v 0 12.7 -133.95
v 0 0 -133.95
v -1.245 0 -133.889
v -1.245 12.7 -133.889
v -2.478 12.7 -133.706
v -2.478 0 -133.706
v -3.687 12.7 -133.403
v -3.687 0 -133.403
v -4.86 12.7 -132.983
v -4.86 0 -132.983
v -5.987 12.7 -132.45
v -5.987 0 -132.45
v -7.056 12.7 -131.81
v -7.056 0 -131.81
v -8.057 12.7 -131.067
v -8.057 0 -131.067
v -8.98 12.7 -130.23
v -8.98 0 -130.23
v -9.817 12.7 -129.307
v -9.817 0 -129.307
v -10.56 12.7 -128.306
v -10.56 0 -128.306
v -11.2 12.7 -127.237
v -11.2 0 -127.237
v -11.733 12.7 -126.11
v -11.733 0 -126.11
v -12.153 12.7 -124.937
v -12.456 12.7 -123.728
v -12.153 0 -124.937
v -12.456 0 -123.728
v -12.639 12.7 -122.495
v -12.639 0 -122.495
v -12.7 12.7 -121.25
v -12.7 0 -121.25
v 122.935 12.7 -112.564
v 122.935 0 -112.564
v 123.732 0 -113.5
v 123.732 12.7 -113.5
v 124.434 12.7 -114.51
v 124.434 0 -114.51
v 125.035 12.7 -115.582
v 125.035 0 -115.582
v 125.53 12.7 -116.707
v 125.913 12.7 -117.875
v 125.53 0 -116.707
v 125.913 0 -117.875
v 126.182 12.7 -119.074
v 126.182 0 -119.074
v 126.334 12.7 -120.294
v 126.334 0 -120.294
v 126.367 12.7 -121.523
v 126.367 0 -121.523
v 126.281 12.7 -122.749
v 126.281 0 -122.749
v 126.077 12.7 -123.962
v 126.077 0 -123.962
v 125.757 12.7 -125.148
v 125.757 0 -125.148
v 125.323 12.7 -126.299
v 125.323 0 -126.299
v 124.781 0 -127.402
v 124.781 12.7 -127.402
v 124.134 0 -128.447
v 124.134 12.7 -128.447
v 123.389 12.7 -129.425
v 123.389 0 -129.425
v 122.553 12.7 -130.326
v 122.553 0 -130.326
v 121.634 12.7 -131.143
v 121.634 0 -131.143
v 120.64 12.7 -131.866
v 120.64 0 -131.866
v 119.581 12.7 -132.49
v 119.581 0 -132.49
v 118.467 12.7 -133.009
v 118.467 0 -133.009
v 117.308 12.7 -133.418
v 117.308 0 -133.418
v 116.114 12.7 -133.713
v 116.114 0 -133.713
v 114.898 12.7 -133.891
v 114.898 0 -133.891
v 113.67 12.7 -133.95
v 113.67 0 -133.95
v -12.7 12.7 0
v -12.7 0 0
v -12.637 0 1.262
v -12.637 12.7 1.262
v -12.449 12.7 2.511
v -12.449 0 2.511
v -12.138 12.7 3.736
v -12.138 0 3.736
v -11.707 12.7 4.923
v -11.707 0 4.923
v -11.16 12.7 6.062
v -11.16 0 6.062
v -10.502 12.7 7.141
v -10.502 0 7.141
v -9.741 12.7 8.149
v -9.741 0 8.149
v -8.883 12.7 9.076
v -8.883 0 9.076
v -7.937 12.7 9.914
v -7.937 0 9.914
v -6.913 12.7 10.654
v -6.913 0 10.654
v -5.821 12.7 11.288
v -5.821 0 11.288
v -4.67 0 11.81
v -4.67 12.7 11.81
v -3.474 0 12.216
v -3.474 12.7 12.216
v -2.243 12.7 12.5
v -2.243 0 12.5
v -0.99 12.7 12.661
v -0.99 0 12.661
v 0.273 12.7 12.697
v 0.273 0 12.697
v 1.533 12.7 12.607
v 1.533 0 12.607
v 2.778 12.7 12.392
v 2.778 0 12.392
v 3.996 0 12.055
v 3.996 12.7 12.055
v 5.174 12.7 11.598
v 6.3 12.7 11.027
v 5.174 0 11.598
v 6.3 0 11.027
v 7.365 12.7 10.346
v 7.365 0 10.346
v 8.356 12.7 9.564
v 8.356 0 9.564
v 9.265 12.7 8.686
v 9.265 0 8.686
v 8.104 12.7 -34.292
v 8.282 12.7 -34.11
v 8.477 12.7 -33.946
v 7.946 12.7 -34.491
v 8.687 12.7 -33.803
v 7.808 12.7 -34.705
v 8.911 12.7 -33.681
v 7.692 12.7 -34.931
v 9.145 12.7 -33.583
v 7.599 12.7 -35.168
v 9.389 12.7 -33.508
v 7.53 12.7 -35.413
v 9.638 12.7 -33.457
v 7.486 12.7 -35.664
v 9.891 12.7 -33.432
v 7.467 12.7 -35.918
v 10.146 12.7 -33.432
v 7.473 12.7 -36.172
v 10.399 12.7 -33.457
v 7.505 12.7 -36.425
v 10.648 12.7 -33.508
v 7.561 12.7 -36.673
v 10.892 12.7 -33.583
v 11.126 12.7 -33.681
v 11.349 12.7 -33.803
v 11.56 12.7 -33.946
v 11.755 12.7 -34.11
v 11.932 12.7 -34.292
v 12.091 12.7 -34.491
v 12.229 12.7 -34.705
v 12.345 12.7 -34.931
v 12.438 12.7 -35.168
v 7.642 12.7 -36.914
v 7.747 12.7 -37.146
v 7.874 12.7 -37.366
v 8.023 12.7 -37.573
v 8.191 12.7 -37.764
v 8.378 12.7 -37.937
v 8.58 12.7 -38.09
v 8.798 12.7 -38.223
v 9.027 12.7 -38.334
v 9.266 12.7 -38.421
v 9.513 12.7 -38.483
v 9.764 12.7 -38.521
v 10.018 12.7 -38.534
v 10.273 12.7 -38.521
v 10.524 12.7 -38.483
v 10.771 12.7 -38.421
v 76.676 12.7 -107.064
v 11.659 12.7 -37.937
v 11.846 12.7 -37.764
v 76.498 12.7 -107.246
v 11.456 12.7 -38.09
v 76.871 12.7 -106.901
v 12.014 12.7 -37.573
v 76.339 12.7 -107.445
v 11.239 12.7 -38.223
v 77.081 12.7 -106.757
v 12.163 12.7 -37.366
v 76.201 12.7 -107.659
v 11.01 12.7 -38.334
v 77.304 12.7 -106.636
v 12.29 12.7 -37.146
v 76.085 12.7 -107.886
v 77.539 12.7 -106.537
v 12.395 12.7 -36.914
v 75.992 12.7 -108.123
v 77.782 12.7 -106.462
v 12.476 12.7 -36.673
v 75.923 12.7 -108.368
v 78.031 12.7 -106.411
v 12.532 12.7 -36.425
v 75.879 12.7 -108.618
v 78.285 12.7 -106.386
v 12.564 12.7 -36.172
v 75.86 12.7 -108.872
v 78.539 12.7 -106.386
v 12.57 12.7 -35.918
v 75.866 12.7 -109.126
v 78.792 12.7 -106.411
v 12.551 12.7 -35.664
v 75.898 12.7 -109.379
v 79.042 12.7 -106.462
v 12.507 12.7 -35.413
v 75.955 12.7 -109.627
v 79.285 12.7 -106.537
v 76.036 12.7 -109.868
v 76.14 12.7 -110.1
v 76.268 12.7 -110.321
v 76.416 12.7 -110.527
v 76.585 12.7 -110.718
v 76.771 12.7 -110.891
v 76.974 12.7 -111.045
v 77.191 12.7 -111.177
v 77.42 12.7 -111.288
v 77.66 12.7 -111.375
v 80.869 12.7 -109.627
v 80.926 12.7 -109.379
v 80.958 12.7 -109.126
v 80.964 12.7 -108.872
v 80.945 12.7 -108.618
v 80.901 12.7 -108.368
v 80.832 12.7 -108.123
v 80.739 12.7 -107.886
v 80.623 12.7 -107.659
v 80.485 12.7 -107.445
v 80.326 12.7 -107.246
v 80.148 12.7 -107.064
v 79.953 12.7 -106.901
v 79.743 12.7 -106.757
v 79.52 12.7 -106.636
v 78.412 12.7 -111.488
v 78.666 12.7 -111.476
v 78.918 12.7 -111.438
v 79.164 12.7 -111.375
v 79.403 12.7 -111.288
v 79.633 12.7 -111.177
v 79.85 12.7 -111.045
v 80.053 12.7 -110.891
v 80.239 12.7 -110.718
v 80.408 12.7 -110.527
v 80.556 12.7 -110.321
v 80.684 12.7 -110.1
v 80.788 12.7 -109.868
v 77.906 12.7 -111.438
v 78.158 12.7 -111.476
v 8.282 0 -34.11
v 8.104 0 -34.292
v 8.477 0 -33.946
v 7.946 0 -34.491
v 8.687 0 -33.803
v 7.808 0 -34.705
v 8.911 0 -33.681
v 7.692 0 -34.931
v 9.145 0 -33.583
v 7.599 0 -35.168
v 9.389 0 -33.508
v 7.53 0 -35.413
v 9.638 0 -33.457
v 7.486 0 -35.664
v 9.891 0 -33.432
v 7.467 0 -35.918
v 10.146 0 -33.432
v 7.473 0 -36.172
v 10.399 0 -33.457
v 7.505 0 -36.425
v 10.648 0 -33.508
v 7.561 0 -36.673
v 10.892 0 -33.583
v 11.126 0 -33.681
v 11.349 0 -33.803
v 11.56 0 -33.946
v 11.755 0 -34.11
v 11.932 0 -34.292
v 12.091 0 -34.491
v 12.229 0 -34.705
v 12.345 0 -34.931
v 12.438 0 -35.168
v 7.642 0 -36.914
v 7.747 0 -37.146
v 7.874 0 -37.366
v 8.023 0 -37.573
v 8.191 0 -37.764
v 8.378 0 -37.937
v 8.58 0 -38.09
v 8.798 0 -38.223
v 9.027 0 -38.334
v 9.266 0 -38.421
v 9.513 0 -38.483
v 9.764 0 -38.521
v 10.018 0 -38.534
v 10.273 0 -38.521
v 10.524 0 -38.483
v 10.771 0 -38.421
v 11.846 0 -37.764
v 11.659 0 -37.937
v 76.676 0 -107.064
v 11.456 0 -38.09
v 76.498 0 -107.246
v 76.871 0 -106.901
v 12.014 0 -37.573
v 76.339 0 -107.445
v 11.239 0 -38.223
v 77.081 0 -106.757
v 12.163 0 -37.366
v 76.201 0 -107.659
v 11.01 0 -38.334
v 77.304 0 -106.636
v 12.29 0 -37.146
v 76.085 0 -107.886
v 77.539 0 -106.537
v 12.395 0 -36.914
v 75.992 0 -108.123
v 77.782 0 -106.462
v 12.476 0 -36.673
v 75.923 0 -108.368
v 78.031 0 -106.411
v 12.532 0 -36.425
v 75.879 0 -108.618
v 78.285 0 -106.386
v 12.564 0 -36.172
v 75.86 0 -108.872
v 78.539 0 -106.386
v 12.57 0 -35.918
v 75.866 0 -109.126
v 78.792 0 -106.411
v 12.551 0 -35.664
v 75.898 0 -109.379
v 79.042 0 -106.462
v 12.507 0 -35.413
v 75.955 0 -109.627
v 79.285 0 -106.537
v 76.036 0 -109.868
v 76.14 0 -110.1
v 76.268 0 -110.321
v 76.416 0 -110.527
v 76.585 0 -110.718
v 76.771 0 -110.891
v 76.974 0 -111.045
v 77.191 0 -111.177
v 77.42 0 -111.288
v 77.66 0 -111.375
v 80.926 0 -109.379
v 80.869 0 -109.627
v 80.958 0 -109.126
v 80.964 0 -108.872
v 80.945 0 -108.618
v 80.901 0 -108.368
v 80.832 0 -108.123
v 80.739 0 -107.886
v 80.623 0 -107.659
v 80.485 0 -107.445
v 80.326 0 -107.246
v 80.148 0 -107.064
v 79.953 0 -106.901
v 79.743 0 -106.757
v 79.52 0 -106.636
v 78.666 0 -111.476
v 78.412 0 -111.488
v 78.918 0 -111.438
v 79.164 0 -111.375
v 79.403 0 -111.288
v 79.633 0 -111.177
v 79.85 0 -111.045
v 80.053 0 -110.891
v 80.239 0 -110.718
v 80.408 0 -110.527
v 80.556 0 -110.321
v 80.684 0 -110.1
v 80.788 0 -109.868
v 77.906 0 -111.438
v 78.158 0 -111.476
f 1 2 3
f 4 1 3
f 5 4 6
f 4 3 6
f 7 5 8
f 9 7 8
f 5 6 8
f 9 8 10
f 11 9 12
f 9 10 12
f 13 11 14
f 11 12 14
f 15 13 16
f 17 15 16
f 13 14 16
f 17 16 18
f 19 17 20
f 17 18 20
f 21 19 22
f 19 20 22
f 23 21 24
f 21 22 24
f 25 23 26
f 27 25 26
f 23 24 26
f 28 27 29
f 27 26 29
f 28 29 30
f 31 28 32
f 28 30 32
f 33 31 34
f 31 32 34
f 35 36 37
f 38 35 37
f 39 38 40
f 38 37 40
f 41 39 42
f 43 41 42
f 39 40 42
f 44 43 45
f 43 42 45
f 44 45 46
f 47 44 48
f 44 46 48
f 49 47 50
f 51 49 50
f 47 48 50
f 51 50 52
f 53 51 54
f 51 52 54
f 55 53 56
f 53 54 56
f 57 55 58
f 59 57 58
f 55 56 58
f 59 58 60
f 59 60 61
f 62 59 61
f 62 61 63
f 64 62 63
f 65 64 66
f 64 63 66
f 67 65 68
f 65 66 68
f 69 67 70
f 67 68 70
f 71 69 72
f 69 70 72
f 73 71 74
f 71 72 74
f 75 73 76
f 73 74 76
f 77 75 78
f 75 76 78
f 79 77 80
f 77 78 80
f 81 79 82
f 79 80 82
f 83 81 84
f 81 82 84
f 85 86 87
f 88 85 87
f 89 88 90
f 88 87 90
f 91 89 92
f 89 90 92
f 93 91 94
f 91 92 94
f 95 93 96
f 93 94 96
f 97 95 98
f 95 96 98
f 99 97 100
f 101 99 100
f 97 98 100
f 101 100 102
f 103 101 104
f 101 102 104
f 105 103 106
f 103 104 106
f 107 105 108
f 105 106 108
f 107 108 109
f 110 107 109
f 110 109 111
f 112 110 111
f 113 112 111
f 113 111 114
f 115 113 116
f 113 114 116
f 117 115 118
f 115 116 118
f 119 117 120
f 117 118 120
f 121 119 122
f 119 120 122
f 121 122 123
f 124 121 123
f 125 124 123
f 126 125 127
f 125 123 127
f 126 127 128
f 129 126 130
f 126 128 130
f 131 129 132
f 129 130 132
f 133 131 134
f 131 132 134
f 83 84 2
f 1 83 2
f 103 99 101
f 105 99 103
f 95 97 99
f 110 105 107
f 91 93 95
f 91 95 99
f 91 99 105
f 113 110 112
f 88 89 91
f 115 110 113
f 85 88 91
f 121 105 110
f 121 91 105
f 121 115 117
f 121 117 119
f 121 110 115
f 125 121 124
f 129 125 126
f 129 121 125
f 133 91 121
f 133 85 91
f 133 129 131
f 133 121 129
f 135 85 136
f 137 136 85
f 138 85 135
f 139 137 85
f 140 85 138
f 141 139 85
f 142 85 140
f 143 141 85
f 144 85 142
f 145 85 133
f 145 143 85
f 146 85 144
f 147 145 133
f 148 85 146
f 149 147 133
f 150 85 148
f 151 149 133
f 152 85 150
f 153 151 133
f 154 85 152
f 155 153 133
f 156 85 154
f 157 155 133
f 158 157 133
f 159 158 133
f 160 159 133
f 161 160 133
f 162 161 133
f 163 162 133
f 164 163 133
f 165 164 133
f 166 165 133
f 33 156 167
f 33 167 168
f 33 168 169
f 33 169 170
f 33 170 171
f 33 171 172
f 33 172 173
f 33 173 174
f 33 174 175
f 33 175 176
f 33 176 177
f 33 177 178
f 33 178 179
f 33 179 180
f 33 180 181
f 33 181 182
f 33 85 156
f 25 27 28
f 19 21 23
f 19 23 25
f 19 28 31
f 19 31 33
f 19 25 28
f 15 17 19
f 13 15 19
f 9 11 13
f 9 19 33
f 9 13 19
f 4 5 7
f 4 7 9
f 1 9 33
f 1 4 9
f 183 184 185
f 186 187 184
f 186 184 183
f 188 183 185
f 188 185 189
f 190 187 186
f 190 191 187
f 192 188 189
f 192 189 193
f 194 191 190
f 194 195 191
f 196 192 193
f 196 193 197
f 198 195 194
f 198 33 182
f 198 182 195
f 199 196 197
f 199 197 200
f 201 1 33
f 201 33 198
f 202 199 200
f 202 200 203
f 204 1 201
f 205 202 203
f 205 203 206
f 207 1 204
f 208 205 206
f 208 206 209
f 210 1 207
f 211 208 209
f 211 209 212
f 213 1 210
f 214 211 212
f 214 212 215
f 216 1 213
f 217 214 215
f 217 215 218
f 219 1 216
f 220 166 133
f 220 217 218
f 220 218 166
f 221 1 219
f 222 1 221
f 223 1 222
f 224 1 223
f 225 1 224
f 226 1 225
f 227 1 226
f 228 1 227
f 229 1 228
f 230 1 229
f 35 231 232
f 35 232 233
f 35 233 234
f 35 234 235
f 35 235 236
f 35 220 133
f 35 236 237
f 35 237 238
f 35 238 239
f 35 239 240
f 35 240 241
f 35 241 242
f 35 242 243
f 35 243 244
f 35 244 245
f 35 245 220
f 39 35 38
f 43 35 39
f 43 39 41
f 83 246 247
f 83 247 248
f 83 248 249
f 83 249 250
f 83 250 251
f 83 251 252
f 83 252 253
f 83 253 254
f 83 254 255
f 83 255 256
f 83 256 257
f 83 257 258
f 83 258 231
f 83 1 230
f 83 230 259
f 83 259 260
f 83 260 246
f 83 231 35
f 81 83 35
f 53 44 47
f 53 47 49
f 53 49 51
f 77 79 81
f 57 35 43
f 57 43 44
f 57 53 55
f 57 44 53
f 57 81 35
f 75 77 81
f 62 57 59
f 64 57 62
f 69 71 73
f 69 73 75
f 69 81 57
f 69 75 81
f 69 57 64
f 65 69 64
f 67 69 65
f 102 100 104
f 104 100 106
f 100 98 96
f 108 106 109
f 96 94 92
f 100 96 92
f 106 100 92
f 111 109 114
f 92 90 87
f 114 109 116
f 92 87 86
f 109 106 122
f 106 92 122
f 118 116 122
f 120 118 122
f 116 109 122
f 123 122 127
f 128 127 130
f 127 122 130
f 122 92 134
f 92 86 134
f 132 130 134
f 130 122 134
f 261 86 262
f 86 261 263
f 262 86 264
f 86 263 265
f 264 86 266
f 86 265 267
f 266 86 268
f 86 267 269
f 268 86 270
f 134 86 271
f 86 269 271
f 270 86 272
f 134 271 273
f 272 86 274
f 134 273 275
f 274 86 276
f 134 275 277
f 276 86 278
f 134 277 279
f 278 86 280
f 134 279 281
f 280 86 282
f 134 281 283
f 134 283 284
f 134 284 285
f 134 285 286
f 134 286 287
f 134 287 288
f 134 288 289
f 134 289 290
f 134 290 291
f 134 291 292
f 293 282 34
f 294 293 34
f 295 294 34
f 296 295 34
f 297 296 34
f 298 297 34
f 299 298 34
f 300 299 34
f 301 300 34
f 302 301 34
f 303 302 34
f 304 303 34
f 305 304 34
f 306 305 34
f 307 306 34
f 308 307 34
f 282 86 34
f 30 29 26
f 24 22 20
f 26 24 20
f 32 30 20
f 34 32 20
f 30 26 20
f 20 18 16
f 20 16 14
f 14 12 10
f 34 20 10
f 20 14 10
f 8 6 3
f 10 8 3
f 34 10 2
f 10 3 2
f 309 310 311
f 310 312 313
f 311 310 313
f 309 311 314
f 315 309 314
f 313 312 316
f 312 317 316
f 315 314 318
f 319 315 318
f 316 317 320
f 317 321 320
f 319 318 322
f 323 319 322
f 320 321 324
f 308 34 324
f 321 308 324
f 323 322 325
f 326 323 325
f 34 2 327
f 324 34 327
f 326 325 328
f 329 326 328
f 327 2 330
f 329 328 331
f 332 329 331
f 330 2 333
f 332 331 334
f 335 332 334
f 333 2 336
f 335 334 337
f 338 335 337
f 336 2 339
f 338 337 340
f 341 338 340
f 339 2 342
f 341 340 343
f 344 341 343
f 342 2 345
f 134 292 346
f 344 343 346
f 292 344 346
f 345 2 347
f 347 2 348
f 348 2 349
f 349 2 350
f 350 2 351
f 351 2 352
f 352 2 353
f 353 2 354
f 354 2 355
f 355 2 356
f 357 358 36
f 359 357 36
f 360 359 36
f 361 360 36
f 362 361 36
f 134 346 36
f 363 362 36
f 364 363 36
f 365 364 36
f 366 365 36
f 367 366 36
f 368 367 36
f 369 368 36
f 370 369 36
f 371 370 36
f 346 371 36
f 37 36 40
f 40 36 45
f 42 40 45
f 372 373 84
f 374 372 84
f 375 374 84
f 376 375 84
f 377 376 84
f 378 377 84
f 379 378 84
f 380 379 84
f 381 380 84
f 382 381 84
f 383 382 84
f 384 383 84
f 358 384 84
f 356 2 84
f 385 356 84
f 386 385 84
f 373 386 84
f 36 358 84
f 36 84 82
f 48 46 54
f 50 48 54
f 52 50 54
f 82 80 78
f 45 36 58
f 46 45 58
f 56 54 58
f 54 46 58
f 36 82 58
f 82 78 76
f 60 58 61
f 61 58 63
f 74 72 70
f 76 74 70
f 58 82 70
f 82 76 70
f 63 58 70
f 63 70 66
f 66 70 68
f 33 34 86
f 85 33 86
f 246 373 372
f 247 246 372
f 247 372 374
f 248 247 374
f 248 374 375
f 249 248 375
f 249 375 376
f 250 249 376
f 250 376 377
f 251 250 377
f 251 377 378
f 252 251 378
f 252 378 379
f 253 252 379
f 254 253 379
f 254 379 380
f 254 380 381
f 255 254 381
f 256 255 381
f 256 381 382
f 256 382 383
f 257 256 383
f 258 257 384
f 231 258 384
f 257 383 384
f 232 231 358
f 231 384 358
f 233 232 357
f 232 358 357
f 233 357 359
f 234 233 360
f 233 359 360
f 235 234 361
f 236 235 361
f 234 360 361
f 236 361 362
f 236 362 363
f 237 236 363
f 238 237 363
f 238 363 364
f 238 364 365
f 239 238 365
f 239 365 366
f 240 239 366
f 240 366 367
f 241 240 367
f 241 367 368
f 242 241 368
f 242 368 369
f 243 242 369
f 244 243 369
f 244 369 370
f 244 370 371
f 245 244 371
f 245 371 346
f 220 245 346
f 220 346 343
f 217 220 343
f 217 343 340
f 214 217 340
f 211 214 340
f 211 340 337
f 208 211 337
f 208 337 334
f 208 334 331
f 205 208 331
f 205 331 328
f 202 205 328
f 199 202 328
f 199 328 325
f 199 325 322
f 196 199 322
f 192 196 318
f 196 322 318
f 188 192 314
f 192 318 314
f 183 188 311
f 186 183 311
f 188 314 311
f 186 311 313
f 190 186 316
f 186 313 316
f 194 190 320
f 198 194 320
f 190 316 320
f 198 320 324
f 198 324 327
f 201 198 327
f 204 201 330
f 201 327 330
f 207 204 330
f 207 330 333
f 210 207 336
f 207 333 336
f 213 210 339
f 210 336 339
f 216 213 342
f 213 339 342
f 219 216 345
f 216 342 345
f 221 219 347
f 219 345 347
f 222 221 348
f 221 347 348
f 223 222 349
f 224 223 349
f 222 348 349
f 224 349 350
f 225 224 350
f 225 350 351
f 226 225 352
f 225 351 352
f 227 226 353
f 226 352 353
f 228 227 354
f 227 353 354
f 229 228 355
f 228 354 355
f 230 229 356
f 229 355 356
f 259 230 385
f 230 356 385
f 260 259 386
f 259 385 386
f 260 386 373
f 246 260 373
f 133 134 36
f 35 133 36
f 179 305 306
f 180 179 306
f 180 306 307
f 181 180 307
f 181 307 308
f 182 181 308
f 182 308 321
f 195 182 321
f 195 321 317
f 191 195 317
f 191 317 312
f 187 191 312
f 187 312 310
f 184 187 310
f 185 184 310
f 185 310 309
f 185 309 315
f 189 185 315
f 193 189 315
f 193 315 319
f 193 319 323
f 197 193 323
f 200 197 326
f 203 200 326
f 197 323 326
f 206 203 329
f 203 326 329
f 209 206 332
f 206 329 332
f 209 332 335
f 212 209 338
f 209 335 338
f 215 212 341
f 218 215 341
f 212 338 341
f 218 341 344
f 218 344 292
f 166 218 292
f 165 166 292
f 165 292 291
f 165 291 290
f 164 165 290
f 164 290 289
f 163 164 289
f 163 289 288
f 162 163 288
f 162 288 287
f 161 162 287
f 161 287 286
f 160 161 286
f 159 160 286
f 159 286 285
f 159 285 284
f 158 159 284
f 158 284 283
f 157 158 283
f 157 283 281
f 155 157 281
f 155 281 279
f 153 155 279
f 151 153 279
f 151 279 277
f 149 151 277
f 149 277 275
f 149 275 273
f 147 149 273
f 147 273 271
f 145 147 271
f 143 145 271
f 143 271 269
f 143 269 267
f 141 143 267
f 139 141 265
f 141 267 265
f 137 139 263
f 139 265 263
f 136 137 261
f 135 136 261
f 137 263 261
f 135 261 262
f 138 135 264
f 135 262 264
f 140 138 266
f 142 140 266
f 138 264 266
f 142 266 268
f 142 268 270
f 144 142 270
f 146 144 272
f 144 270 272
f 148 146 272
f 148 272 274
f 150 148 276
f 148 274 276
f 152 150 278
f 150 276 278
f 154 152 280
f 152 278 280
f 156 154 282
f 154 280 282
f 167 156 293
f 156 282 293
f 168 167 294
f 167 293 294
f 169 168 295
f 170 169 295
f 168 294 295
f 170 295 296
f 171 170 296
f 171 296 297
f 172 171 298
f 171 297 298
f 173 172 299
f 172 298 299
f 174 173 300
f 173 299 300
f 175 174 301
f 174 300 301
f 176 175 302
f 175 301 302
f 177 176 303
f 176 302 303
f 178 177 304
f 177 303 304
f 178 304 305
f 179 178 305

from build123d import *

# Parameters (mm, degrees)
BOSS_EXTRUDE1_DEPTH         = 12.7
F_1_4_20_TAPPED_HOLE1_D     = 5.1054
F_1_4_20_TAPPED_HOLE1_DEPTH = 19.05
F_1_4_20_TAPPED_HOLE1_TIP   = 1.533816902


with BuildPart() as part:
    # Sketch1 → Boss-Extrude1 (new body)
    with BuildSketch(Plane(origin=(0, 0, 0), x_dir=(1, 0, 0), z_dir=(0, 1, 0))):
        with BuildLine():
            Line((-12.7, 121.25), (-12.7, 0))
            ThreePointArc((-12.7, 0), (-4.670226784, -11.810122005), (9.265193981, -8.685976081))
            Line((9.265193981, -8.685976081), (122.935193981, 112.564023919))
            ThreePointArc((122.935193981, 112.564023919), (125.323366386, 126.298668328), (113.67, 133.95))
            Line((113.67, 133.95), (0, 133.95))
            ThreePointArc((0, 133.95), (-8.980256121, 130.230256121), (-12.7, 121.25))
        make_face()
    extrude(amount=BOSS_EXTRUDE1_DEPTH)

    # 1/4-20 Tapped Hole1
    with Locations(Plane(origin=(10.018427162, 12.7, -35.98129538), x_dir=(0, 0, 1), z_dir=(0, 1, 0))):
        with Locations((0, 0), (-72.954283318, 68.393512452)):
            Hole(F_1_4_20_TAPPED_HOLE1_D / 2, depth=F_1_4_20_TAPPED_HOLE1_DEPTH)
            with Locations((0, 0, -(F_1_4_20_TAPPED_HOLE1_DEPTH + F_1_4_20_TAPPED_HOLE1_TIP / 2))):  # 118° drill point
                Cone(0, F_1_4_20_TAPPED_HOLE1_D / 2, F_1_4_20_TAPPED_HOLE1_TIP, mode=Mode.SUBTRACT)


solid = part.part
